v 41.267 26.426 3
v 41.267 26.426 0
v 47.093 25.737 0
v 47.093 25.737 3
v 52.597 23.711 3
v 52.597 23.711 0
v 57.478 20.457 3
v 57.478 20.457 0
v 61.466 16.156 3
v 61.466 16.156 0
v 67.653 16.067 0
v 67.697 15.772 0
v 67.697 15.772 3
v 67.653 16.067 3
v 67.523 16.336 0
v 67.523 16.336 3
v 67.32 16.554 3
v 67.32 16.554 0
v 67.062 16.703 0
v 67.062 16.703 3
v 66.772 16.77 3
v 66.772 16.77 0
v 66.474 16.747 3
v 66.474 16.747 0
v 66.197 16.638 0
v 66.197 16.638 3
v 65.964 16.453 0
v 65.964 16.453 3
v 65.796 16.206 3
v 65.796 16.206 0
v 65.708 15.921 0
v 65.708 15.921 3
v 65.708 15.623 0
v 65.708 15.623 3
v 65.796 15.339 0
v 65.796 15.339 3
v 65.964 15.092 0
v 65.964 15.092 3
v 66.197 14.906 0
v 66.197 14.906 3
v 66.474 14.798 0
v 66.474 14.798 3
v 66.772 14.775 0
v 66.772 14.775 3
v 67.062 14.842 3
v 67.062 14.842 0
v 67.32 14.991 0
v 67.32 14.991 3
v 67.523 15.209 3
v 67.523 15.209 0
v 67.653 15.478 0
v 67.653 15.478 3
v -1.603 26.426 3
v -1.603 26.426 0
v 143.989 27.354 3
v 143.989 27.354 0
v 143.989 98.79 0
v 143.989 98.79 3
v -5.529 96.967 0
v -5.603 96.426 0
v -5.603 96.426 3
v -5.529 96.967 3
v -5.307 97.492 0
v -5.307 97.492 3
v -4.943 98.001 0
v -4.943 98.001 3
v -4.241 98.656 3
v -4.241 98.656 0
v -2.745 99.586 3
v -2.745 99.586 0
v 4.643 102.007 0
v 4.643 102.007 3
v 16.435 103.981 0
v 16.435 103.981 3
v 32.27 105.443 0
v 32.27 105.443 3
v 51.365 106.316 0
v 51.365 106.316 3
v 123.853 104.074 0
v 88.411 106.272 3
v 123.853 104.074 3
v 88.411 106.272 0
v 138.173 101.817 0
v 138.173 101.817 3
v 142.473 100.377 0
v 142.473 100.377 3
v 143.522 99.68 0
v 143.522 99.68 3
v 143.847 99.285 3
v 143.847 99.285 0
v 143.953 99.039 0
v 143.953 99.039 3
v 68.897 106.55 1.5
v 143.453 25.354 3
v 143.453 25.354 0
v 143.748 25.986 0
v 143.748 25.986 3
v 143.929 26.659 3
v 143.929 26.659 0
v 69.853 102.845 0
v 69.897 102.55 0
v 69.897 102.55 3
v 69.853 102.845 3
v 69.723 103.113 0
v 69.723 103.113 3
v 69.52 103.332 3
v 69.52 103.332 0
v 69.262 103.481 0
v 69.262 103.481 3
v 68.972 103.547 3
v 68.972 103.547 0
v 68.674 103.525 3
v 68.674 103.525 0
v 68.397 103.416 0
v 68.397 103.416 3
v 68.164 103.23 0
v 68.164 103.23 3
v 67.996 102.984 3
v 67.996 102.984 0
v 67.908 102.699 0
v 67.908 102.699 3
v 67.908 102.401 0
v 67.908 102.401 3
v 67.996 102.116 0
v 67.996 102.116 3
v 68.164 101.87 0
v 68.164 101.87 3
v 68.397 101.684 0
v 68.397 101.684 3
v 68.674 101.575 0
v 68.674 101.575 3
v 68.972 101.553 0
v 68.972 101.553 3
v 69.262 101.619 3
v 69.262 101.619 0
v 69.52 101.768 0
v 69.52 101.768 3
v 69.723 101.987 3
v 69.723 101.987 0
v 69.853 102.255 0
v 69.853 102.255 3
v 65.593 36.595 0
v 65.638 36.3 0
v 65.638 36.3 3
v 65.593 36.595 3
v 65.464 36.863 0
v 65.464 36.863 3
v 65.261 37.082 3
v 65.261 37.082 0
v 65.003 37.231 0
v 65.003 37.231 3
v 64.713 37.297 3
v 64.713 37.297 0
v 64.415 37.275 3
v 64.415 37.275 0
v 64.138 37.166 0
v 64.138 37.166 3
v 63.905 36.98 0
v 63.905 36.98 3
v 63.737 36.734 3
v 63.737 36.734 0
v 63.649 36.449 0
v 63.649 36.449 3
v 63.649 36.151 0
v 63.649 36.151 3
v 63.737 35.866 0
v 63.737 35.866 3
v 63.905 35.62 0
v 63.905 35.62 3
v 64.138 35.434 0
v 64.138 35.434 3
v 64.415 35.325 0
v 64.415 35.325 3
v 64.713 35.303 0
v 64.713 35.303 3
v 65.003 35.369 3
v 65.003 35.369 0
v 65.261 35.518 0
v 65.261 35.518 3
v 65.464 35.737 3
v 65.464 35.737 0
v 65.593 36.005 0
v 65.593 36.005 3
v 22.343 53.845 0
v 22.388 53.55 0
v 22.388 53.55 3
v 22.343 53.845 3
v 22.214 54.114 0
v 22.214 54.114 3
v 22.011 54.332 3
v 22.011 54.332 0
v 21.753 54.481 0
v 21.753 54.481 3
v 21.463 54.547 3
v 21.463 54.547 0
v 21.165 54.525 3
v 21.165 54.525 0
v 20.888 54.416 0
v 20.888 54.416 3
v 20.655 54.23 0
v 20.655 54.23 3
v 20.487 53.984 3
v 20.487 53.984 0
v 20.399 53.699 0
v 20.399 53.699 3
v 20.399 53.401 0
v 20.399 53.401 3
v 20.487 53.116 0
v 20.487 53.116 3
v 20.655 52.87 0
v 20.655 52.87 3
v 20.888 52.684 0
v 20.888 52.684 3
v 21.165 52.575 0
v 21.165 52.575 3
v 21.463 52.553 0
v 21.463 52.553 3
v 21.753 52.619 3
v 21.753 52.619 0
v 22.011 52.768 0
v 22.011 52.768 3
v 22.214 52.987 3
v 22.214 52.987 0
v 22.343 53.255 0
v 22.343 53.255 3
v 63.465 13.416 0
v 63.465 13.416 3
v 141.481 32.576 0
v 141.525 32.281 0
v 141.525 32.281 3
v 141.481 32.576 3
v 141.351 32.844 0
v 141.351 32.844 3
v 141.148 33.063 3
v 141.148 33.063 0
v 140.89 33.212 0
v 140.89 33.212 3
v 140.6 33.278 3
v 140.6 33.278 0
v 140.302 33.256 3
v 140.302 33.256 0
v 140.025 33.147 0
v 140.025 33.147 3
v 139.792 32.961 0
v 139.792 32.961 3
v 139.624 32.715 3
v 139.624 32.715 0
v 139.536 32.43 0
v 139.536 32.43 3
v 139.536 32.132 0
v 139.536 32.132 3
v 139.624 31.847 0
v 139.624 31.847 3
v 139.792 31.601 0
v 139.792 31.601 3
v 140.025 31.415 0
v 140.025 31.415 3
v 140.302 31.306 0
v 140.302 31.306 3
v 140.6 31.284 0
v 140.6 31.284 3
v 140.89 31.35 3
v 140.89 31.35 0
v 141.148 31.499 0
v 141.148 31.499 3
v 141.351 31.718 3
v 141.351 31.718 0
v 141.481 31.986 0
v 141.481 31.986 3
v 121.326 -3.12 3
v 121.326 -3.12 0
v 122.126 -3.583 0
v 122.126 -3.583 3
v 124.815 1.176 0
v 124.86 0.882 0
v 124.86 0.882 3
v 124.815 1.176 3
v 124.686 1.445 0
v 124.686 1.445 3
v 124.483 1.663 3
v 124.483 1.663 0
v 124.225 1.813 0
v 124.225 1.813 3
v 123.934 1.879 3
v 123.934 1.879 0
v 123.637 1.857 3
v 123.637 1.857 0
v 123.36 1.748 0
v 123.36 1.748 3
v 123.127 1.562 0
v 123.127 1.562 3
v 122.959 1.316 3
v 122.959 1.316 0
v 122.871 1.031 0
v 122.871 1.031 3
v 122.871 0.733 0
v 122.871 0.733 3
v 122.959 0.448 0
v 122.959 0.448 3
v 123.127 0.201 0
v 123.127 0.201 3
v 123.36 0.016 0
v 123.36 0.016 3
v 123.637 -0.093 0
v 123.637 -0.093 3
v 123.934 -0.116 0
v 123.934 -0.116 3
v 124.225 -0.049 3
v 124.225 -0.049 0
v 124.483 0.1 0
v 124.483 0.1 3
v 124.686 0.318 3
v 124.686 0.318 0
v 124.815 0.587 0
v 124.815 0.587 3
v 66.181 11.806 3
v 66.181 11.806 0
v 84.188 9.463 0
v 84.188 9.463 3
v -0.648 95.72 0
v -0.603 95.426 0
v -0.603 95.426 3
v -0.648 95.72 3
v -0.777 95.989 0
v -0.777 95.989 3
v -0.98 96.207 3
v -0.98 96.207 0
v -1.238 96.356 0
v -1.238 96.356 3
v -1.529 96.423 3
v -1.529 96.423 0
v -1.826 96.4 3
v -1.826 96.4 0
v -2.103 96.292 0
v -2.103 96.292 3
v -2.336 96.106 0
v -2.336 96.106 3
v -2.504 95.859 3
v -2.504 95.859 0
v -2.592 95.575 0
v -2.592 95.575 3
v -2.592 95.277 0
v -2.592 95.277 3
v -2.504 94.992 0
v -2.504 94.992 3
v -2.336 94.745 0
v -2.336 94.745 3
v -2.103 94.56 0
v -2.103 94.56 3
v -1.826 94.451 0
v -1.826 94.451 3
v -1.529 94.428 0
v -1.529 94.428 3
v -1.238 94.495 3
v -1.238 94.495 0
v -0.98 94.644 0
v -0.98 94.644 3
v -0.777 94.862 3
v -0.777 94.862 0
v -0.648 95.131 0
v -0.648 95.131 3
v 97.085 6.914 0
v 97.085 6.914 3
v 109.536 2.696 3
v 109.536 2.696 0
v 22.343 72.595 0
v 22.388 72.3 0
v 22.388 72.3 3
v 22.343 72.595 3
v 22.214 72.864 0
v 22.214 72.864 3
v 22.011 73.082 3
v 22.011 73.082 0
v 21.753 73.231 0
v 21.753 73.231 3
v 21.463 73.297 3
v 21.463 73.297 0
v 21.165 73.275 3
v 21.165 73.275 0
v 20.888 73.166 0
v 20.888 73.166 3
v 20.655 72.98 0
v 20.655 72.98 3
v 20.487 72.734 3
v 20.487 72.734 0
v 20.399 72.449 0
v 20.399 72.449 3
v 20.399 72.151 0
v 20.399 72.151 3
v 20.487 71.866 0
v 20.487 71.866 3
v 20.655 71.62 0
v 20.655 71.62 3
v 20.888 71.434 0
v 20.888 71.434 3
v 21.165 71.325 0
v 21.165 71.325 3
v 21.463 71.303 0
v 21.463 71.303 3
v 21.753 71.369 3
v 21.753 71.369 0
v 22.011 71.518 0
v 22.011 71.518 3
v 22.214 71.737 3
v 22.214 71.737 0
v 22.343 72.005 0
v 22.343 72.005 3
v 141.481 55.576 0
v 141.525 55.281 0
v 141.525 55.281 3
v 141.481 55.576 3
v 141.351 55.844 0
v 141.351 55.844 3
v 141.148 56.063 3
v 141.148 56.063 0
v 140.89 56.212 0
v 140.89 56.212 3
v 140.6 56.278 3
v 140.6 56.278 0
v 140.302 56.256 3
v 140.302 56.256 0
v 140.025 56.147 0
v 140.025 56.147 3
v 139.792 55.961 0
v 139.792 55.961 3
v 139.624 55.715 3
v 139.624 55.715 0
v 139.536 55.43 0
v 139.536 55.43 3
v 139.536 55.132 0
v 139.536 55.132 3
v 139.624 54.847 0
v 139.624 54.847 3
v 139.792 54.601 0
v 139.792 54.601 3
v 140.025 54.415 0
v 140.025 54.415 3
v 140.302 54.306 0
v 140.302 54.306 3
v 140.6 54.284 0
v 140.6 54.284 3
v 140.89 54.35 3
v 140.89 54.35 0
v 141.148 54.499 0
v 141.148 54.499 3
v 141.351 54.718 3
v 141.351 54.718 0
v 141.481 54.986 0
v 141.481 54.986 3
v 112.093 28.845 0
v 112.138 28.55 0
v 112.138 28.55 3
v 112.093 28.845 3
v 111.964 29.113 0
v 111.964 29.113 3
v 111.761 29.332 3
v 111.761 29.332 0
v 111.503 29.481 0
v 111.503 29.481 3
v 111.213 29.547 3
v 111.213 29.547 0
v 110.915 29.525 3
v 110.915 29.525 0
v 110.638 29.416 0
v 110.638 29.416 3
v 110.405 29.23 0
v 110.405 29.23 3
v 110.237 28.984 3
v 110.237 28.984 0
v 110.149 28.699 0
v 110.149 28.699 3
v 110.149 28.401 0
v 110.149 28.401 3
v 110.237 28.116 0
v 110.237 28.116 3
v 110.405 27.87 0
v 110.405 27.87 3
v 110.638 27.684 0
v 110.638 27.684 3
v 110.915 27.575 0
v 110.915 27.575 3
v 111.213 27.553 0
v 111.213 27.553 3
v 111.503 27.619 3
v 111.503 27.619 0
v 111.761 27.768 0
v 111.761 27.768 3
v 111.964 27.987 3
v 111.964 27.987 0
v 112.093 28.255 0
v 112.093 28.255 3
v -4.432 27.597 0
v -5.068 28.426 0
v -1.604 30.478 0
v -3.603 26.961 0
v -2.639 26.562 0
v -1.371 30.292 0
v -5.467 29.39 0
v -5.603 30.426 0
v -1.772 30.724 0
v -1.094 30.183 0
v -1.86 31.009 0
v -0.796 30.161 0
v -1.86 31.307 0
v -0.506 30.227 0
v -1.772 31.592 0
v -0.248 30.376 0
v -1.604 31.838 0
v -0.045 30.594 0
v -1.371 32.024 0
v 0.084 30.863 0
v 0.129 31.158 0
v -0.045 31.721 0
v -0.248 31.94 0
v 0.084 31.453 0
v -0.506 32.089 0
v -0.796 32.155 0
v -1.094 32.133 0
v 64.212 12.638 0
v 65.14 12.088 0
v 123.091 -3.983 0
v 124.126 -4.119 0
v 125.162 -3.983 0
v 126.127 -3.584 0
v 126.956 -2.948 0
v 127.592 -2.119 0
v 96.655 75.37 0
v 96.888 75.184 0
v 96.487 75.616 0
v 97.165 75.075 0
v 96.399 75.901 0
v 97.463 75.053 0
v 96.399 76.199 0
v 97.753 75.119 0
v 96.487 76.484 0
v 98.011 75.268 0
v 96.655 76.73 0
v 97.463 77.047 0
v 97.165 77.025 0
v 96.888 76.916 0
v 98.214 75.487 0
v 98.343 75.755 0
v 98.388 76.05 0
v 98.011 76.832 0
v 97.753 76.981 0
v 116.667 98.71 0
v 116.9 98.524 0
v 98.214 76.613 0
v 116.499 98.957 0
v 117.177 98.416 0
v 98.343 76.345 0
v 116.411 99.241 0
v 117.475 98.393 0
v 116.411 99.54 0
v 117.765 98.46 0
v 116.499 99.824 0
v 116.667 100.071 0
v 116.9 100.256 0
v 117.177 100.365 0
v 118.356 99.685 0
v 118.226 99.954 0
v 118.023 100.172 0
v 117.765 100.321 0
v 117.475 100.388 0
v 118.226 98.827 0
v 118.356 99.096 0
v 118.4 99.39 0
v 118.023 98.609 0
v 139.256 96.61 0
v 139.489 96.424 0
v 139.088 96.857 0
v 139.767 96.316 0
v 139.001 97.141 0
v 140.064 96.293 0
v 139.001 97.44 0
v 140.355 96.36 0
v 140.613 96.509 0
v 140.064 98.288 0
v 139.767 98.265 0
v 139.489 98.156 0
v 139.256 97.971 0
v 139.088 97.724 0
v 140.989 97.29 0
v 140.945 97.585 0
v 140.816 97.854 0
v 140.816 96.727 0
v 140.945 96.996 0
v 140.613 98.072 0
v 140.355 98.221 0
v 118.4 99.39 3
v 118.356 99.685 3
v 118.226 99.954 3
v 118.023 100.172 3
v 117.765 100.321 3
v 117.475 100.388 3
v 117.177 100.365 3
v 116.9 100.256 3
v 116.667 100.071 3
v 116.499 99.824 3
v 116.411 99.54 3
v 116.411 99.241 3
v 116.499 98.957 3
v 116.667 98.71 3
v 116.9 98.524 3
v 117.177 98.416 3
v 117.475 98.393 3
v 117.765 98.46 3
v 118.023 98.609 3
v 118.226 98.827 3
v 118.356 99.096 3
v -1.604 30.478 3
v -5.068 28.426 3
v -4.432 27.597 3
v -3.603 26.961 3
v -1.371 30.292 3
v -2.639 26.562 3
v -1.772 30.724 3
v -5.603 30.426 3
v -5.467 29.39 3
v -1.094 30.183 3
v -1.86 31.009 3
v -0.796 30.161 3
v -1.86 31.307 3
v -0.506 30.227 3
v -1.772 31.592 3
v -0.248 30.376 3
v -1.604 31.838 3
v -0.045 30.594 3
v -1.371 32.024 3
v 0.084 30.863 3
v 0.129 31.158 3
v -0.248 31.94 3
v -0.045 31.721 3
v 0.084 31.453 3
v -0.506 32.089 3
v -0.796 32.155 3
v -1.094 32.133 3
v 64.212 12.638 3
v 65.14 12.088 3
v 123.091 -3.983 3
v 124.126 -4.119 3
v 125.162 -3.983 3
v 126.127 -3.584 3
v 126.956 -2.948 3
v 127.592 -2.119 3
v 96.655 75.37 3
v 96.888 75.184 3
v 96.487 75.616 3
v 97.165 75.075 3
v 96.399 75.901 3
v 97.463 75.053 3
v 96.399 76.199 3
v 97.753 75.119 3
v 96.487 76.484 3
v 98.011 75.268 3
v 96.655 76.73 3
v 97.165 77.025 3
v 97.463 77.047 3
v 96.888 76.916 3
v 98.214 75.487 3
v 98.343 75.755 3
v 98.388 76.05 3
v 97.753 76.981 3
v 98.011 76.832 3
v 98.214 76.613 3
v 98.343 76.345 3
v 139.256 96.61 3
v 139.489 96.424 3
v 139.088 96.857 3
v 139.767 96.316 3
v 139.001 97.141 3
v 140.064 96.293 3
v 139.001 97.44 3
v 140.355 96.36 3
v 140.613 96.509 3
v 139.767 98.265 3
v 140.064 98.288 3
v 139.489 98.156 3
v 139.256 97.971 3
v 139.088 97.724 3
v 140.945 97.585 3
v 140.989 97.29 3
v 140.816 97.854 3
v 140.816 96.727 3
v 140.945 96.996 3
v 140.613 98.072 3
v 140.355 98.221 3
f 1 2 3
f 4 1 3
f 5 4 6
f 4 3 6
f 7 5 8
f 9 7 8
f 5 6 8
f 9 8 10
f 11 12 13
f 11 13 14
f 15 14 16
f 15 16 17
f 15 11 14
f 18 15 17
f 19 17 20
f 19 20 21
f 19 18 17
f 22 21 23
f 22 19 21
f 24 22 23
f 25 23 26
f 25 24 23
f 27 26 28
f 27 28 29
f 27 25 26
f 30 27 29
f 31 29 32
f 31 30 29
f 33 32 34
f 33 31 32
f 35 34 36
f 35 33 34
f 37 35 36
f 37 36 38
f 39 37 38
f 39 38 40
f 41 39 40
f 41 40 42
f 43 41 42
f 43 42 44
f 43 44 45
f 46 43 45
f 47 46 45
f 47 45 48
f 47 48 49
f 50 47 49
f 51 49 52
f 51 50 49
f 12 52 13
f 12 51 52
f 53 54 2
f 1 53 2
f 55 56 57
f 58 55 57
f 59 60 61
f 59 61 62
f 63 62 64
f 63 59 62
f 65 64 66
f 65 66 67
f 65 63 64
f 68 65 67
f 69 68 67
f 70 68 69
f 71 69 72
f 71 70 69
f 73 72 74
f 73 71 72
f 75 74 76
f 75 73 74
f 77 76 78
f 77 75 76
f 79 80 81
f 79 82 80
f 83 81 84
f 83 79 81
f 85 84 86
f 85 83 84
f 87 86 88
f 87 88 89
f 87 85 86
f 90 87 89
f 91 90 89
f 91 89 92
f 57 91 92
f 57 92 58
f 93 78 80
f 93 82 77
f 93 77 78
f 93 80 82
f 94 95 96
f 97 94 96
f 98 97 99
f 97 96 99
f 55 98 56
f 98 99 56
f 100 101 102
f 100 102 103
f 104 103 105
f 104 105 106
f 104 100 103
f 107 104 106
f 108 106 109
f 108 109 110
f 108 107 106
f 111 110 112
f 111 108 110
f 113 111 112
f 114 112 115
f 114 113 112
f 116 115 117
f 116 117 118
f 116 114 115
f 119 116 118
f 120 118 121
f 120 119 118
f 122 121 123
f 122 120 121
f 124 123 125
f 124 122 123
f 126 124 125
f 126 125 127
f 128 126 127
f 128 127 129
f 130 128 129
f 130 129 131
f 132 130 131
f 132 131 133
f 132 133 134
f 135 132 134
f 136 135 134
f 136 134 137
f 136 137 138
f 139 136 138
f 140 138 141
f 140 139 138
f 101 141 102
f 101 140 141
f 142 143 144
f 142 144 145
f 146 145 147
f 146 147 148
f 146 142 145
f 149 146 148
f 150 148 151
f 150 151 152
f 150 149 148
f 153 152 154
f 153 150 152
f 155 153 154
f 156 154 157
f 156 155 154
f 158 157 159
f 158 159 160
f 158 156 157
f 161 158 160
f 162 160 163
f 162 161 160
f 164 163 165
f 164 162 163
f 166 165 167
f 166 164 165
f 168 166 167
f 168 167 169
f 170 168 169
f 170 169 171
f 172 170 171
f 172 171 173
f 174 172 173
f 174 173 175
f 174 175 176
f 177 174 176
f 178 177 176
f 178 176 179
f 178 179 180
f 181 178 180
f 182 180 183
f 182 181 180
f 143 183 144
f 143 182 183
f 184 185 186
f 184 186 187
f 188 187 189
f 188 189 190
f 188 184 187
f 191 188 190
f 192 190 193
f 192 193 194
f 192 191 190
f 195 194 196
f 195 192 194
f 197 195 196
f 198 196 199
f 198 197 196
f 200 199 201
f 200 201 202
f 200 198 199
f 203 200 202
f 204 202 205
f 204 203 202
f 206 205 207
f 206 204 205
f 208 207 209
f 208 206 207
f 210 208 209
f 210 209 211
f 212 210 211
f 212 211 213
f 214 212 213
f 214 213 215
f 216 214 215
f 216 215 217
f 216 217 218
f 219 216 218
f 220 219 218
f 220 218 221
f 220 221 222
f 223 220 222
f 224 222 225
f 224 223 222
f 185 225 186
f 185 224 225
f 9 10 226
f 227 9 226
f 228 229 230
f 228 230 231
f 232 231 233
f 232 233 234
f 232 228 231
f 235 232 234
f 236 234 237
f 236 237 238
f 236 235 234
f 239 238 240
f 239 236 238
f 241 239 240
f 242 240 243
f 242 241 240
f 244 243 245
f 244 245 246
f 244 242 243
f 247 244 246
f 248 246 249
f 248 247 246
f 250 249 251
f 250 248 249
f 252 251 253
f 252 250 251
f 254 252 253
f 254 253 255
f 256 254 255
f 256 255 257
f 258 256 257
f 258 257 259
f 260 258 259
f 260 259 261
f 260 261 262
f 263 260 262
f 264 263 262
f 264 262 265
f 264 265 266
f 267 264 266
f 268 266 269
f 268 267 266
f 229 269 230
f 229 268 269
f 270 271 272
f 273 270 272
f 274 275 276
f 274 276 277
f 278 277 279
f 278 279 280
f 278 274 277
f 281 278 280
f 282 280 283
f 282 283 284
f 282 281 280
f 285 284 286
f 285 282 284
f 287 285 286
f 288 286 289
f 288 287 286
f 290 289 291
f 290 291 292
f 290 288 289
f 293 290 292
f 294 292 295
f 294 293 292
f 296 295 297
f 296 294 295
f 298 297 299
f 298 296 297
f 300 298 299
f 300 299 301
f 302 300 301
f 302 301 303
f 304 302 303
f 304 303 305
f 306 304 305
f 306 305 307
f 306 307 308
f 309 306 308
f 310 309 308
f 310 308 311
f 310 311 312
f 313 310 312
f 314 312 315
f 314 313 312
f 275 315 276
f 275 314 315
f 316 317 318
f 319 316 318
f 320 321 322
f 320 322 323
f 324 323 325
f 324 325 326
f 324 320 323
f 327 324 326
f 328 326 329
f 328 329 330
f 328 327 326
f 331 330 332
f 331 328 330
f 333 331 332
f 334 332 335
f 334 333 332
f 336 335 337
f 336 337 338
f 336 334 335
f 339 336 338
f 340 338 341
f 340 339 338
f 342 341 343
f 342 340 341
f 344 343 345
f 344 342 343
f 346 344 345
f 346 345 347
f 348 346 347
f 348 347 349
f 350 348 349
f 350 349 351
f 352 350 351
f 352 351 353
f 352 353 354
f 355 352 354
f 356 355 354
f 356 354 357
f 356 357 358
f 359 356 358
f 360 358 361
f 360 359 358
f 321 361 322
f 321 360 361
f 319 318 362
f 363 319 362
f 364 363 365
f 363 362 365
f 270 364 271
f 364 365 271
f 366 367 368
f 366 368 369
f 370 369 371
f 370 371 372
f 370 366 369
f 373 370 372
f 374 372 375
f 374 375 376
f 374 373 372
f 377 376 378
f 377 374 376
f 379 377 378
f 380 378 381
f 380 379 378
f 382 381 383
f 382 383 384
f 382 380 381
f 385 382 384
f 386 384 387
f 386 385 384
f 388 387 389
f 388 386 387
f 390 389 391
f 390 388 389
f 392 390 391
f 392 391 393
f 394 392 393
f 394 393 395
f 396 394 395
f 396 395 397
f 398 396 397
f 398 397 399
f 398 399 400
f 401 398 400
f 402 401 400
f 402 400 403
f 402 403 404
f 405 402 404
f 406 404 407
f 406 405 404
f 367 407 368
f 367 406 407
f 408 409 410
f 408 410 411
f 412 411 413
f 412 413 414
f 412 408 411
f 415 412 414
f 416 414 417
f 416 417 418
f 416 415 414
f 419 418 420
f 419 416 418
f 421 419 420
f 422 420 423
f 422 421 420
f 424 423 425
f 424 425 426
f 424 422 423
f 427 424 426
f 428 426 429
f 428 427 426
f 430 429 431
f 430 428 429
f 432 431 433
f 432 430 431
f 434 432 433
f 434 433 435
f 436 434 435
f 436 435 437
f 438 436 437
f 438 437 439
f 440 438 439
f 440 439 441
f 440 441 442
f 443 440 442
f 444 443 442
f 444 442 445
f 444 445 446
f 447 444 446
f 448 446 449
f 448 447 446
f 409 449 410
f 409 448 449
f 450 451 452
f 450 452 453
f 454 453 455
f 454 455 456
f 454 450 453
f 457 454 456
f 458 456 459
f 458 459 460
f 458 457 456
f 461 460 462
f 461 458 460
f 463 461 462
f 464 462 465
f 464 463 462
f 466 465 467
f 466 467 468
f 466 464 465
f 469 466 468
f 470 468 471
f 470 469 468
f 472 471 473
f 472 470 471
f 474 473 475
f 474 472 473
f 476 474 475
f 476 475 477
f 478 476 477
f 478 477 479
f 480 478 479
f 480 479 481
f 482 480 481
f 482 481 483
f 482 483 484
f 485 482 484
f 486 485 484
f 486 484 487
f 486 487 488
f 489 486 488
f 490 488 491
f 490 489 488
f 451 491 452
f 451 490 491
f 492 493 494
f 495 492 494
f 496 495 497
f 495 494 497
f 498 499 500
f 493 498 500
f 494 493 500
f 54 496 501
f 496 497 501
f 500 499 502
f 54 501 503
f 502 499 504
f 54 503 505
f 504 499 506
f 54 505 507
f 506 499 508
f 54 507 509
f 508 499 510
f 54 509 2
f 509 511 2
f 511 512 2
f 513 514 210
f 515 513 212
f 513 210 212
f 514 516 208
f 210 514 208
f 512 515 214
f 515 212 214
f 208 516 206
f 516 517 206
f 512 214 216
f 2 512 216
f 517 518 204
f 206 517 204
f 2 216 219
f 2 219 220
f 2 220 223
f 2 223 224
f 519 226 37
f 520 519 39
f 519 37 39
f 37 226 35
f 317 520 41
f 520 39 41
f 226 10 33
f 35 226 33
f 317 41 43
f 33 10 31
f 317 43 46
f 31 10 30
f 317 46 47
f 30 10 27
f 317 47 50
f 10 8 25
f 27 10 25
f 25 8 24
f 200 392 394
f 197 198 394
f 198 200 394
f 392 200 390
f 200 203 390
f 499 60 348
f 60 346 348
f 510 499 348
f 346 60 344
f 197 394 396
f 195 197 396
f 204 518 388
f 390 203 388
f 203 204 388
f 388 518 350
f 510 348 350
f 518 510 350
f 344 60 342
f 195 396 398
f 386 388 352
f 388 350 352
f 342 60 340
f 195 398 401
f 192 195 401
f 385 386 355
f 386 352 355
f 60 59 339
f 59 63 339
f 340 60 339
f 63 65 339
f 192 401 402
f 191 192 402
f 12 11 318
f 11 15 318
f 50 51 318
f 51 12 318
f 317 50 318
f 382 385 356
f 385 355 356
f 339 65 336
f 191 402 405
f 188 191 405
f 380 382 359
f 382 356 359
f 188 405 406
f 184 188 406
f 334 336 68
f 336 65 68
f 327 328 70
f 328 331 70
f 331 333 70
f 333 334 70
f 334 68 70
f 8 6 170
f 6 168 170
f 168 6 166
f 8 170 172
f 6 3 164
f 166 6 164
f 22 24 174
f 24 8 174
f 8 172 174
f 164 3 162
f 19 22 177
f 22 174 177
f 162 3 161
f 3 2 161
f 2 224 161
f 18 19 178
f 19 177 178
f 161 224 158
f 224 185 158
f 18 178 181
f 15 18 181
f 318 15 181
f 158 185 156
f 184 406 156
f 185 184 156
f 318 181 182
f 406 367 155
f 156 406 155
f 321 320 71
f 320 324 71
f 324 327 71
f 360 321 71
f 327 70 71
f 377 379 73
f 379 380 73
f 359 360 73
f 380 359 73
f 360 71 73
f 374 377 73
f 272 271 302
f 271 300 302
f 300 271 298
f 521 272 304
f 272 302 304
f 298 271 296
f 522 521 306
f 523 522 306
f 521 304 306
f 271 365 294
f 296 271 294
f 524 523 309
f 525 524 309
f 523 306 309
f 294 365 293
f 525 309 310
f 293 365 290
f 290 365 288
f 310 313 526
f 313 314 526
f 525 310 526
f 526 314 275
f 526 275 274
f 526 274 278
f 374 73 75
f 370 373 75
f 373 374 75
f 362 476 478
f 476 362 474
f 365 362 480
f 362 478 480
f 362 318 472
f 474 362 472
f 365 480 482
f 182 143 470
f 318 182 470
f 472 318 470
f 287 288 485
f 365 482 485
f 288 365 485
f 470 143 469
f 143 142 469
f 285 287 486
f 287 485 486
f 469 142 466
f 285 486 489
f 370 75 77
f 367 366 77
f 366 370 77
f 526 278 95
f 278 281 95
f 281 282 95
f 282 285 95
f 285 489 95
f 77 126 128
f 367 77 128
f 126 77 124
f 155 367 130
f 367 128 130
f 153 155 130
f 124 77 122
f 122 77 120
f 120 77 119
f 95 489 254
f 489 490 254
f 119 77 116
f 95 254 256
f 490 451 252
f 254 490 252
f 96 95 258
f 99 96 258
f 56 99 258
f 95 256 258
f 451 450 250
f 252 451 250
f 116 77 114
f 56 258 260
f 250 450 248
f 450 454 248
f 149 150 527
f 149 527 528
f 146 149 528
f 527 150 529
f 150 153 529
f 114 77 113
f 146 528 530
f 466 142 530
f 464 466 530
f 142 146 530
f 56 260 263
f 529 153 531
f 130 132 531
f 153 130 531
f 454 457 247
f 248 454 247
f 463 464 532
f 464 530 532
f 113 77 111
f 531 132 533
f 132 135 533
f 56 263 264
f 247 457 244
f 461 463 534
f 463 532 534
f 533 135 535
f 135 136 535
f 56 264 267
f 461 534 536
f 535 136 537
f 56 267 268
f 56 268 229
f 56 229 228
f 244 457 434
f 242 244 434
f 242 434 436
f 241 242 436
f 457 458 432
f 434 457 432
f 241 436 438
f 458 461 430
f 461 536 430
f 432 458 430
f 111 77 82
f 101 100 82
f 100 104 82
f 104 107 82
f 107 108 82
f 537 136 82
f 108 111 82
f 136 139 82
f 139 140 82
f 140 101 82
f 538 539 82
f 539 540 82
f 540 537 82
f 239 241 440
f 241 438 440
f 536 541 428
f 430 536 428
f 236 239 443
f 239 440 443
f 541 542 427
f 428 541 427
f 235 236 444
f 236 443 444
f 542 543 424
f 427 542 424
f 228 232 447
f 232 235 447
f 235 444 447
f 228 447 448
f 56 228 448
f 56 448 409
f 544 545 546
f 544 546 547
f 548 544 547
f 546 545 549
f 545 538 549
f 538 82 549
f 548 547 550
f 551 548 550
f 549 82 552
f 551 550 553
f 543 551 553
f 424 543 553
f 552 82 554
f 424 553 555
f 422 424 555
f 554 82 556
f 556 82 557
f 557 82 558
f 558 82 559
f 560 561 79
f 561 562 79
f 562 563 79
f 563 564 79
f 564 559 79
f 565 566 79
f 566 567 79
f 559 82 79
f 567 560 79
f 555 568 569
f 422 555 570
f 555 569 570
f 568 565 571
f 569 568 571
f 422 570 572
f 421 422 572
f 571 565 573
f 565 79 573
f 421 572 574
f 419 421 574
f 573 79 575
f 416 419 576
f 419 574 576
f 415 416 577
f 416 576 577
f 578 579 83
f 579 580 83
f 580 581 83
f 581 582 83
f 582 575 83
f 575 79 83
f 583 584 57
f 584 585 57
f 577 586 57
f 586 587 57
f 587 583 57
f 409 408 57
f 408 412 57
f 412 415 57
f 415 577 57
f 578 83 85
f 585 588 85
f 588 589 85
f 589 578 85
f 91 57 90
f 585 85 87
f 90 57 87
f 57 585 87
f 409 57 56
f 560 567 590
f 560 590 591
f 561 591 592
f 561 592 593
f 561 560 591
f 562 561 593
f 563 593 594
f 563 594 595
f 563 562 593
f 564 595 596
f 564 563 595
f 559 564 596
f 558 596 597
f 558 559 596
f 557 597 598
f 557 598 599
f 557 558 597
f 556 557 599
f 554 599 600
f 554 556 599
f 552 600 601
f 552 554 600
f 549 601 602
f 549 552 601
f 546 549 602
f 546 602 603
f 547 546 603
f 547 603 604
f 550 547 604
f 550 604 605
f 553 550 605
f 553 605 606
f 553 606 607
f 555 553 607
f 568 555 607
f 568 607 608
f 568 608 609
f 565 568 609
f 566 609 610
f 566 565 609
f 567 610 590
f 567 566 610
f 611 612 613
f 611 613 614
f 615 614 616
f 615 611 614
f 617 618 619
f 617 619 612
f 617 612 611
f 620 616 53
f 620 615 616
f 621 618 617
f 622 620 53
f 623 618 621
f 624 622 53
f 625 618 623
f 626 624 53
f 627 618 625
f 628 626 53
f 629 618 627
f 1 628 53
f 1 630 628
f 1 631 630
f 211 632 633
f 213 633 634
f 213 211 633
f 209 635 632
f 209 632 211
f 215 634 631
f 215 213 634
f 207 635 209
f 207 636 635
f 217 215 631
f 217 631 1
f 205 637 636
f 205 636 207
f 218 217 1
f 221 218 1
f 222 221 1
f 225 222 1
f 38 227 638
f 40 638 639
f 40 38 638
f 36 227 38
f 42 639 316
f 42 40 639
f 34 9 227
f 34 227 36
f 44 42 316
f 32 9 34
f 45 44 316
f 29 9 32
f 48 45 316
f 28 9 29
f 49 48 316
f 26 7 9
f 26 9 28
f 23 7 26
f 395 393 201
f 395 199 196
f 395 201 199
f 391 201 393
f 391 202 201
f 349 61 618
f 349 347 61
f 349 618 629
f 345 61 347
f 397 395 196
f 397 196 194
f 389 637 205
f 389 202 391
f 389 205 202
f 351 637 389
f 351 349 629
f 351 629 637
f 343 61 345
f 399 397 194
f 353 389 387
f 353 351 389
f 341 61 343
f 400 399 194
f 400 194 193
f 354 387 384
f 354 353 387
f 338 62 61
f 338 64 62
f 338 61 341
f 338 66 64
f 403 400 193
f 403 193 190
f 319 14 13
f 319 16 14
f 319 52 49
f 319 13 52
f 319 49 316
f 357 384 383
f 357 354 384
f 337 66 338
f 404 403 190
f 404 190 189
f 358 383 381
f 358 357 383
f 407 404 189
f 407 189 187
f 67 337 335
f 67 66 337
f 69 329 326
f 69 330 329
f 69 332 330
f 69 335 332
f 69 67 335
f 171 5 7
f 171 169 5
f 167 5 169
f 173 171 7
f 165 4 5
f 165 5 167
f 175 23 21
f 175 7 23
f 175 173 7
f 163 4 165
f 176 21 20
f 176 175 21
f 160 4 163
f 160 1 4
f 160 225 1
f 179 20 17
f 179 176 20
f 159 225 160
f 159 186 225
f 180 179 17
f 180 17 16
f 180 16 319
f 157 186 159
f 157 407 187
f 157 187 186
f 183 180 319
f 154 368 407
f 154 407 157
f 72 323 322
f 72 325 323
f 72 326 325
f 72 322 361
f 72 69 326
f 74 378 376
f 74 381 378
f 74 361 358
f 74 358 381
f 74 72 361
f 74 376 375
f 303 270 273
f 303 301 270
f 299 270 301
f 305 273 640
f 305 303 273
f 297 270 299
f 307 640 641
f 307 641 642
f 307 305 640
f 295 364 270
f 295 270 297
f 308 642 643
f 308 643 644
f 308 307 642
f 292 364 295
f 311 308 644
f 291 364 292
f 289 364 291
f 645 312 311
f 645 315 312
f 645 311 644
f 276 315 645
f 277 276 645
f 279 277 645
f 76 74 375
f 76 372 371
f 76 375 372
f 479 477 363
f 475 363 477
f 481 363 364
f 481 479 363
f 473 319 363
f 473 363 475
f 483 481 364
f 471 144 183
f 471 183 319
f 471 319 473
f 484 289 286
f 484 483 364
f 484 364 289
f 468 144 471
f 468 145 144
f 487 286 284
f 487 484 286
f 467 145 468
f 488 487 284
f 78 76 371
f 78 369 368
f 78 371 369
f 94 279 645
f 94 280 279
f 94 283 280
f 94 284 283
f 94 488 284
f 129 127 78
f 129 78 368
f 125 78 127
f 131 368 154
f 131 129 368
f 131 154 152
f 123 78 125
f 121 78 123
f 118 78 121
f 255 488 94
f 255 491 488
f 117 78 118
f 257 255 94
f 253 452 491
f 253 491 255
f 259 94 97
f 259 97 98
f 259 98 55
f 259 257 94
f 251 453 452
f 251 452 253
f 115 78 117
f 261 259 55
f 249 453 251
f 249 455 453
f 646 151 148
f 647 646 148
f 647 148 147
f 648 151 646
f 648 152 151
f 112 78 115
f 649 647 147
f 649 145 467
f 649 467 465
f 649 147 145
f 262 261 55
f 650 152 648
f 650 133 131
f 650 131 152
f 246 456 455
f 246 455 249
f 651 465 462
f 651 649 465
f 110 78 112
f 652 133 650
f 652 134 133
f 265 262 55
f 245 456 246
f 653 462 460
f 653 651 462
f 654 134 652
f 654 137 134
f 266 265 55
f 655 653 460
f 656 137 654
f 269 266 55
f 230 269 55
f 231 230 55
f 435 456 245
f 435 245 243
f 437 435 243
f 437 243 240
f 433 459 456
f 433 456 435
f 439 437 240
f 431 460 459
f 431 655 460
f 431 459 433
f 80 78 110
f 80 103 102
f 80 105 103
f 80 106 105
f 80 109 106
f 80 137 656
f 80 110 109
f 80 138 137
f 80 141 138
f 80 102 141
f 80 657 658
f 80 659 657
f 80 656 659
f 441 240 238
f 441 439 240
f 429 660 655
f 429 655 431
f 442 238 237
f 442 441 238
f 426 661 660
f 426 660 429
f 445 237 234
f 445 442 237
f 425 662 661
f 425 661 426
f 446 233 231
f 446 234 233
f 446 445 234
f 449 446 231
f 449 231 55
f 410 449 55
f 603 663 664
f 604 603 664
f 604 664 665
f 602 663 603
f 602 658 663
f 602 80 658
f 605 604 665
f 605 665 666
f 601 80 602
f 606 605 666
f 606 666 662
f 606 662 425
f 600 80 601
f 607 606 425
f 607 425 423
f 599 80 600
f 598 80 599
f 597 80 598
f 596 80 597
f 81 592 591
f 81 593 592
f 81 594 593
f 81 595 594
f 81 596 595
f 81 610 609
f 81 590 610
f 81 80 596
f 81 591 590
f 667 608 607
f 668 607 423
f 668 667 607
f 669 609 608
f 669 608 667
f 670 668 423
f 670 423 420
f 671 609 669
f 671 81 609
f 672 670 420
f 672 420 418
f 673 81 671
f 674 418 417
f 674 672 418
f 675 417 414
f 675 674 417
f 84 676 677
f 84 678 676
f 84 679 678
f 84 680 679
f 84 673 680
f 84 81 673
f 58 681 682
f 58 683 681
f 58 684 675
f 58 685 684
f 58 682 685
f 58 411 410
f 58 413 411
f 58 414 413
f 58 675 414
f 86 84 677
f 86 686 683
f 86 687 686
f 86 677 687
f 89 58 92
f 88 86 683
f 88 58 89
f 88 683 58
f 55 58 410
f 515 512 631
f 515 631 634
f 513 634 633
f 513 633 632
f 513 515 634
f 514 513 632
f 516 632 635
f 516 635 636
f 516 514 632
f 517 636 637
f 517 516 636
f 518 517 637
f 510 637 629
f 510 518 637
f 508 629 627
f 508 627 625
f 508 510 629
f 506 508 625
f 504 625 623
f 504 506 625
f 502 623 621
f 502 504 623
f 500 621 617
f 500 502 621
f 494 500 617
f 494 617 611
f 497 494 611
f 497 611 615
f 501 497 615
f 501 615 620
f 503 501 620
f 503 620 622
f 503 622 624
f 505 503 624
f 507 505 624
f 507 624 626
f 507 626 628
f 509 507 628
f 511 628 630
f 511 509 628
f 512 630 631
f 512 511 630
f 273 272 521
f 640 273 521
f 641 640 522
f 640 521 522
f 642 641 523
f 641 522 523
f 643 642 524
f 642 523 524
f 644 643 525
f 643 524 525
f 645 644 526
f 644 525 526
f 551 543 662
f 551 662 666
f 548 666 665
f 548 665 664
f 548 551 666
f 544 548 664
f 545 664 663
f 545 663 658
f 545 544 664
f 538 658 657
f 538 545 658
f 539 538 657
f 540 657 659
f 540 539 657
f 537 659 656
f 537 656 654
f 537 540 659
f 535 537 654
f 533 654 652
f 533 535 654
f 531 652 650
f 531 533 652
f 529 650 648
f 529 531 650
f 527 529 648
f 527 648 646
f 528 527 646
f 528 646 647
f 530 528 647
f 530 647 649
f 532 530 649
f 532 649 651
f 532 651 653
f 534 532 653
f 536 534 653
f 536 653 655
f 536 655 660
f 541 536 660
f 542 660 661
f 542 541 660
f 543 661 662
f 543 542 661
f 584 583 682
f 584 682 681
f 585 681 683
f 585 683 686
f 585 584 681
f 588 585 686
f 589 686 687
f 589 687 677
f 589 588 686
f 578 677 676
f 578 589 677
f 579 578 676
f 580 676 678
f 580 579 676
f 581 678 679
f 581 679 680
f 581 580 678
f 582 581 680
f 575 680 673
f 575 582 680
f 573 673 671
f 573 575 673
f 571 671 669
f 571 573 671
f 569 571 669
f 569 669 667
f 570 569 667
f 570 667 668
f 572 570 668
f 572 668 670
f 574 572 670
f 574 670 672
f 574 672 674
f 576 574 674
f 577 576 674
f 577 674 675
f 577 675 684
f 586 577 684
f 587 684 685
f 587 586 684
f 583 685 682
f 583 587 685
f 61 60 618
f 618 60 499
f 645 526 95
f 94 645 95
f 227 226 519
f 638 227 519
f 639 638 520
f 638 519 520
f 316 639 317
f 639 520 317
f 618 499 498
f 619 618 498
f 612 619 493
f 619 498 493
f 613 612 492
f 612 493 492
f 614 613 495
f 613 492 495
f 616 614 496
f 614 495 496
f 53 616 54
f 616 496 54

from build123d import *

# Parameters (mm, degrees)
SKETCH2_R           = 1
BOSS_EXTRUDE1_DEPTH = 3


with BuildPart() as part:
    # Sketch2 → Boss-Extrude1 (new body)
    with BuildSketch(Plane.XY):
        with BuildLine():
            Line((-5.603408365, 96.42556159), (-5.603408365, 30.425568858))
            ThreePointArc((-5.603408365, 30.425568858), (-4.43183549, 27.597141733), (-1.603408365, 26.425568858))
            Line((-1.603408365, 26.425568858), (41.26721418, 26.425568858))
            ThreePointArc((41.26721418, 26.425568858), (52.597121833, 23.710837368), (61.46641692, 16.156224264))
            Line((61.46641692, 16.156224264), (63.465114175, 13.41553894))
            ThreePointArc((63.465114175, 13.41553894), (64.657533725, 12.331421876), (66.181004174, 11.805863146))
            Line((66.181004174, 11.805863146), (84.187939735, 9.463477264))
            ThreePointArc((84.187939735, 9.463477264), (103.379739296, 5.009808001), (121.325879515, -3.120160731))
            Line((121.325879515, -3.120160731), (122.126093986, -3.582626958))
            ThreePointArc((122.126093986, -3.582626958), (125.162033535, -3.98331921), (127.591695632, -2.119391819))
            Line((127.591695632, -2.119391819), (143.453487011, 25.354036748))
            ThreePointArc((143.453487011, 25.354036748), (143.853088701, 26.318760568), (143.989385396, 27.354036748))
            Line((143.989385396, 27.354036748), (143.989385396, 98.790469349))
            add(Edge.make_bspline(
                [(-5.603408365, 96.42556159), (-5.603408365, 103.460733083), (68.627157279, 109.640132521), (143.989385396, 103.458567417), (143.989385396, 98.790469349)],
                knots=[0, 0, 0, 0, 0.499912399, 1, 1, 1, 1], degree=3))
        make_face()
        with Locations((21.387798276, 72.300241098)):
            Circle(SKETCH2_R, mode=Mode.SUBTRACT)
        with Locations((21.387798276, 53.550235091)):
            Circle(SKETCH2_R, mode=Mode.SUBTRACT)
        with Locations((64.637863533, 36.300090173)):
            Circle(SKETCH2_R, mode=Mode.SUBTRACT)
        with Locations((111.137845658, 28.550051811)):
            Circle(SKETCH2_R, mode=Mode.SUBTRACT)
        with Locations((97.387827206, 76.050038887)):
            Circle(SKETCH2_R, mode=Mode.SUBTRACT)
        with Locations((140.524945013, 32.281066453)):
            Circle(SKETCH2_R, mode=Mode.SUBTRACT)
        with Locations((123.859596668, 0.88165491)):
            Circle(SKETCH2_R, mode=Mode.SUBTRACT)
        with Locations((66.696986614, 15.772443805)):
            Circle(SKETCH2_R, mode=Mode.SUBTRACT)
        with Locations((-0.871175318, 31.157801905)):
            Circle(SKETCH2_R, mode=Mode.SUBTRACT)
        with Locations((-1.603408365, 95.42556159)):
            Circle(SKETCH2_R, mode=Mode.SUBTRACT)
        with Locations((68.896968427, 102.54989148)):
            Circle(SKETCH2_R, mode=Mode.SUBTRACT)
        with Locations((117.399952063, 99.390469349)):
            Circle(SKETCH2_R, mode=Mode.SUBTRACT)
        with Locations((139.989385396, 97.290469349)):
            Circle(SKETCH2_R, mode=Mode.SUBTRACT)
        with Locations((140.524945013, 55.281066453)):
            Circle(SKETCH2_R, mode=Mode.SUBTRACT)
    extrude(amount=BOSS_EXTRUDE1_DEPTH)


solid = part.part
